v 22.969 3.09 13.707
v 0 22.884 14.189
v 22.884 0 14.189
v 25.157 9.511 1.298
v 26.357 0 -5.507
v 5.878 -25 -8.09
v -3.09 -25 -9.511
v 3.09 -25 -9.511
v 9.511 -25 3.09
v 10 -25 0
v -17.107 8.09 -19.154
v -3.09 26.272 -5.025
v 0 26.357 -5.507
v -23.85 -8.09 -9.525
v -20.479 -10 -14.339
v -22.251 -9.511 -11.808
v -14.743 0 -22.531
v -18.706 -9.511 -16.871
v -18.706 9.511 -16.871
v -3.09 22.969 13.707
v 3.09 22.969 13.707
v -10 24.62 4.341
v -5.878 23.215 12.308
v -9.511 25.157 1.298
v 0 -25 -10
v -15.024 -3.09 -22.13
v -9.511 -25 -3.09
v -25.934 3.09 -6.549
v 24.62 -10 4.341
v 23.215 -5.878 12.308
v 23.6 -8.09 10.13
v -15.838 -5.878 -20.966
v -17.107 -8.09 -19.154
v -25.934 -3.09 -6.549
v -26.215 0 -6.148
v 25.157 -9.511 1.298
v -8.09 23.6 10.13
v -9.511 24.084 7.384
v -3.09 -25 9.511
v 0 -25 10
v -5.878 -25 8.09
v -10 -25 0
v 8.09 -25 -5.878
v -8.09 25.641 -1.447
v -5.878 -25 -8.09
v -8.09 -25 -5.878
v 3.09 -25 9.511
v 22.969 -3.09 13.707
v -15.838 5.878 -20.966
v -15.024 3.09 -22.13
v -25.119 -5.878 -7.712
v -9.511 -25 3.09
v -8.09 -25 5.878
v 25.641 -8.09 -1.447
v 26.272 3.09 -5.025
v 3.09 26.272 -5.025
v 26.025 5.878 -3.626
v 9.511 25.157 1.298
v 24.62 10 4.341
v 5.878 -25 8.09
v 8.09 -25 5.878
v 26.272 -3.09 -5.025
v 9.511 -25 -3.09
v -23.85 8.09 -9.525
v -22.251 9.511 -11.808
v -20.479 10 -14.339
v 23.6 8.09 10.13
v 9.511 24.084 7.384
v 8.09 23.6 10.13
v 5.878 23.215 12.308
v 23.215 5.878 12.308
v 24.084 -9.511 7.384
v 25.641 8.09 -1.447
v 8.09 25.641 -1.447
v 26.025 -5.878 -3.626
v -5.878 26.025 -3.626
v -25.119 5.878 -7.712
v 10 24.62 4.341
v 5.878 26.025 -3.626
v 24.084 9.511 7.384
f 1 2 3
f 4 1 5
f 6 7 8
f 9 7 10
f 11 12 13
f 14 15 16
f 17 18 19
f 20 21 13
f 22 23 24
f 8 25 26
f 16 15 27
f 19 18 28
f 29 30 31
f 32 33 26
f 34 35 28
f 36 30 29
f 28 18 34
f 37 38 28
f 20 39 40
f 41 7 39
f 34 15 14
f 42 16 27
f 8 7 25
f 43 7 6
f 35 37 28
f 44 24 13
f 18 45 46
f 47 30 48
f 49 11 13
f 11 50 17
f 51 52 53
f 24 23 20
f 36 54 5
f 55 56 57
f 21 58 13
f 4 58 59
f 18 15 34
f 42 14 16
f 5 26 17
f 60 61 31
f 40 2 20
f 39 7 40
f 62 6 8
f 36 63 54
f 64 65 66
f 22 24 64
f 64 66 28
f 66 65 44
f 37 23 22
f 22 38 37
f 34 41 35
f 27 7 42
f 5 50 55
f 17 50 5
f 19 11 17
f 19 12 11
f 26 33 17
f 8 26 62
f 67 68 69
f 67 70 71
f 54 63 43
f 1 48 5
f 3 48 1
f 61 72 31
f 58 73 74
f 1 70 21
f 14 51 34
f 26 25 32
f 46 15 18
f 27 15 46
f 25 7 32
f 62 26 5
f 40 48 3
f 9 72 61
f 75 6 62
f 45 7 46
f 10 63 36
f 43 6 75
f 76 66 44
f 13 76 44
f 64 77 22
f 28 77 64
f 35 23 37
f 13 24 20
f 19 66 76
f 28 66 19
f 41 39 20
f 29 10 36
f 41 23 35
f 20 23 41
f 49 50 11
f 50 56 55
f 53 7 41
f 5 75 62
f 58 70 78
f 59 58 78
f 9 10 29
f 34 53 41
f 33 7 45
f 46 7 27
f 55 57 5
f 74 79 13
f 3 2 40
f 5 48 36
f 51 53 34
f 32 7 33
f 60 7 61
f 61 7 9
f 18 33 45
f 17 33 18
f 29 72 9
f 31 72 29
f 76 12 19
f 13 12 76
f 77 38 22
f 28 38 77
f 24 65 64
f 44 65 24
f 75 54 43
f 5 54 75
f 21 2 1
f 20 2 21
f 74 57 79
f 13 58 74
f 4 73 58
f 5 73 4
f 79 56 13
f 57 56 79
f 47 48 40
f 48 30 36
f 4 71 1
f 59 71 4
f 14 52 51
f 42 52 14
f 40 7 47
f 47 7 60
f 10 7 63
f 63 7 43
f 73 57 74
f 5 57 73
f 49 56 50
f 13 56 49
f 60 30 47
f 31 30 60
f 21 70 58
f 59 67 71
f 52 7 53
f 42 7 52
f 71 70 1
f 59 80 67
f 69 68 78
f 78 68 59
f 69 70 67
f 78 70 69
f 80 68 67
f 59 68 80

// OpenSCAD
a=translatePoint(makeRing(10),[0,-25,0]);
echo(a);
b= rotateOnY(rotateOnZ(a,90),10);
echo(b);

c=rotateOnZ(b,90);
d=rotateOnY(rotateOnZ(c,90),45);
echo(c);


hull(){
color("red")cloud(a);
color("blue")cloud(b);
color("green")cloud(c);
color("green")cloud(d);
}
module cloud(p)
{
    hull()    polyhedron(p,[[each[0:len(p)-1]]]);
    }
function join3loops(l1,l2,l3)=
[]

;


function makeRing(r)=
[for(i=[0:360/20:360])[sin(i)*r,0,cos(i)*r] ]

;

function rotateOnZ(l,angle)=
[for(p=l)rotatePointOnZ(p,angle)]
;
function rotateOnY(l,angle)=
[for(p=l)rotatePointOnY(p,angle)]
;function rotateOnX(l,angle)=
[for(p=l)rotatePointOnX(p,angle)]
;
function translatePoint(l,t)=
[for(i=l)i+t]
;
function rotatePointOnZ(p,angle)
 = 
    let(cosa = cos(angle), sina = sin(angle))
    [
        p.x * cosa - p.y * sina,
        p.x * sina + p.y * cosa,
        p.z
    ];
function rotatePointOnX(p,angle)
 = 
    let(cosa = cos(angle), sina = sin(angle))
    [   p.x,
        p.y * cosa - p.z * sina,
        p.y * sina + p.z * cosa,
   
    ];
function rotatePointOnY(p,angle)
 = 
    let(cosa = cos(angle), sina = sin(angle))
    [   p.x * cosa - p.z * sina,
        p.y ,
        p.x * sina + p.z * cosa,
   
    ];
function wrapi(x,tak) =  ((x  % tak) + tak) % tak; // wraps index 0 - x 
 function wrap(x,x_max=1,x_min=0) =

 (((x - x_min) % (x_max - x_min)) + (x_max - x_min)) % (x_max - x_min) + x_min; // wraps numbers 



module polyline(p) {for(i=[0:max(0,len(p)-2)])line(p[i],p[wrap(i+1,len(p) )]);}
module polyline_open(p) {
     if (len(p)-1>1)
     for(i=[0:max(0,len(p)-2)])line(p[i],p[   i+1]);
} // polyline plotter

module line(p1,p2 ,width=2) 
{ // single line plotter
hull() {
translate(p1) sphere(width);
translate(p2) sphere(width);
}
}
